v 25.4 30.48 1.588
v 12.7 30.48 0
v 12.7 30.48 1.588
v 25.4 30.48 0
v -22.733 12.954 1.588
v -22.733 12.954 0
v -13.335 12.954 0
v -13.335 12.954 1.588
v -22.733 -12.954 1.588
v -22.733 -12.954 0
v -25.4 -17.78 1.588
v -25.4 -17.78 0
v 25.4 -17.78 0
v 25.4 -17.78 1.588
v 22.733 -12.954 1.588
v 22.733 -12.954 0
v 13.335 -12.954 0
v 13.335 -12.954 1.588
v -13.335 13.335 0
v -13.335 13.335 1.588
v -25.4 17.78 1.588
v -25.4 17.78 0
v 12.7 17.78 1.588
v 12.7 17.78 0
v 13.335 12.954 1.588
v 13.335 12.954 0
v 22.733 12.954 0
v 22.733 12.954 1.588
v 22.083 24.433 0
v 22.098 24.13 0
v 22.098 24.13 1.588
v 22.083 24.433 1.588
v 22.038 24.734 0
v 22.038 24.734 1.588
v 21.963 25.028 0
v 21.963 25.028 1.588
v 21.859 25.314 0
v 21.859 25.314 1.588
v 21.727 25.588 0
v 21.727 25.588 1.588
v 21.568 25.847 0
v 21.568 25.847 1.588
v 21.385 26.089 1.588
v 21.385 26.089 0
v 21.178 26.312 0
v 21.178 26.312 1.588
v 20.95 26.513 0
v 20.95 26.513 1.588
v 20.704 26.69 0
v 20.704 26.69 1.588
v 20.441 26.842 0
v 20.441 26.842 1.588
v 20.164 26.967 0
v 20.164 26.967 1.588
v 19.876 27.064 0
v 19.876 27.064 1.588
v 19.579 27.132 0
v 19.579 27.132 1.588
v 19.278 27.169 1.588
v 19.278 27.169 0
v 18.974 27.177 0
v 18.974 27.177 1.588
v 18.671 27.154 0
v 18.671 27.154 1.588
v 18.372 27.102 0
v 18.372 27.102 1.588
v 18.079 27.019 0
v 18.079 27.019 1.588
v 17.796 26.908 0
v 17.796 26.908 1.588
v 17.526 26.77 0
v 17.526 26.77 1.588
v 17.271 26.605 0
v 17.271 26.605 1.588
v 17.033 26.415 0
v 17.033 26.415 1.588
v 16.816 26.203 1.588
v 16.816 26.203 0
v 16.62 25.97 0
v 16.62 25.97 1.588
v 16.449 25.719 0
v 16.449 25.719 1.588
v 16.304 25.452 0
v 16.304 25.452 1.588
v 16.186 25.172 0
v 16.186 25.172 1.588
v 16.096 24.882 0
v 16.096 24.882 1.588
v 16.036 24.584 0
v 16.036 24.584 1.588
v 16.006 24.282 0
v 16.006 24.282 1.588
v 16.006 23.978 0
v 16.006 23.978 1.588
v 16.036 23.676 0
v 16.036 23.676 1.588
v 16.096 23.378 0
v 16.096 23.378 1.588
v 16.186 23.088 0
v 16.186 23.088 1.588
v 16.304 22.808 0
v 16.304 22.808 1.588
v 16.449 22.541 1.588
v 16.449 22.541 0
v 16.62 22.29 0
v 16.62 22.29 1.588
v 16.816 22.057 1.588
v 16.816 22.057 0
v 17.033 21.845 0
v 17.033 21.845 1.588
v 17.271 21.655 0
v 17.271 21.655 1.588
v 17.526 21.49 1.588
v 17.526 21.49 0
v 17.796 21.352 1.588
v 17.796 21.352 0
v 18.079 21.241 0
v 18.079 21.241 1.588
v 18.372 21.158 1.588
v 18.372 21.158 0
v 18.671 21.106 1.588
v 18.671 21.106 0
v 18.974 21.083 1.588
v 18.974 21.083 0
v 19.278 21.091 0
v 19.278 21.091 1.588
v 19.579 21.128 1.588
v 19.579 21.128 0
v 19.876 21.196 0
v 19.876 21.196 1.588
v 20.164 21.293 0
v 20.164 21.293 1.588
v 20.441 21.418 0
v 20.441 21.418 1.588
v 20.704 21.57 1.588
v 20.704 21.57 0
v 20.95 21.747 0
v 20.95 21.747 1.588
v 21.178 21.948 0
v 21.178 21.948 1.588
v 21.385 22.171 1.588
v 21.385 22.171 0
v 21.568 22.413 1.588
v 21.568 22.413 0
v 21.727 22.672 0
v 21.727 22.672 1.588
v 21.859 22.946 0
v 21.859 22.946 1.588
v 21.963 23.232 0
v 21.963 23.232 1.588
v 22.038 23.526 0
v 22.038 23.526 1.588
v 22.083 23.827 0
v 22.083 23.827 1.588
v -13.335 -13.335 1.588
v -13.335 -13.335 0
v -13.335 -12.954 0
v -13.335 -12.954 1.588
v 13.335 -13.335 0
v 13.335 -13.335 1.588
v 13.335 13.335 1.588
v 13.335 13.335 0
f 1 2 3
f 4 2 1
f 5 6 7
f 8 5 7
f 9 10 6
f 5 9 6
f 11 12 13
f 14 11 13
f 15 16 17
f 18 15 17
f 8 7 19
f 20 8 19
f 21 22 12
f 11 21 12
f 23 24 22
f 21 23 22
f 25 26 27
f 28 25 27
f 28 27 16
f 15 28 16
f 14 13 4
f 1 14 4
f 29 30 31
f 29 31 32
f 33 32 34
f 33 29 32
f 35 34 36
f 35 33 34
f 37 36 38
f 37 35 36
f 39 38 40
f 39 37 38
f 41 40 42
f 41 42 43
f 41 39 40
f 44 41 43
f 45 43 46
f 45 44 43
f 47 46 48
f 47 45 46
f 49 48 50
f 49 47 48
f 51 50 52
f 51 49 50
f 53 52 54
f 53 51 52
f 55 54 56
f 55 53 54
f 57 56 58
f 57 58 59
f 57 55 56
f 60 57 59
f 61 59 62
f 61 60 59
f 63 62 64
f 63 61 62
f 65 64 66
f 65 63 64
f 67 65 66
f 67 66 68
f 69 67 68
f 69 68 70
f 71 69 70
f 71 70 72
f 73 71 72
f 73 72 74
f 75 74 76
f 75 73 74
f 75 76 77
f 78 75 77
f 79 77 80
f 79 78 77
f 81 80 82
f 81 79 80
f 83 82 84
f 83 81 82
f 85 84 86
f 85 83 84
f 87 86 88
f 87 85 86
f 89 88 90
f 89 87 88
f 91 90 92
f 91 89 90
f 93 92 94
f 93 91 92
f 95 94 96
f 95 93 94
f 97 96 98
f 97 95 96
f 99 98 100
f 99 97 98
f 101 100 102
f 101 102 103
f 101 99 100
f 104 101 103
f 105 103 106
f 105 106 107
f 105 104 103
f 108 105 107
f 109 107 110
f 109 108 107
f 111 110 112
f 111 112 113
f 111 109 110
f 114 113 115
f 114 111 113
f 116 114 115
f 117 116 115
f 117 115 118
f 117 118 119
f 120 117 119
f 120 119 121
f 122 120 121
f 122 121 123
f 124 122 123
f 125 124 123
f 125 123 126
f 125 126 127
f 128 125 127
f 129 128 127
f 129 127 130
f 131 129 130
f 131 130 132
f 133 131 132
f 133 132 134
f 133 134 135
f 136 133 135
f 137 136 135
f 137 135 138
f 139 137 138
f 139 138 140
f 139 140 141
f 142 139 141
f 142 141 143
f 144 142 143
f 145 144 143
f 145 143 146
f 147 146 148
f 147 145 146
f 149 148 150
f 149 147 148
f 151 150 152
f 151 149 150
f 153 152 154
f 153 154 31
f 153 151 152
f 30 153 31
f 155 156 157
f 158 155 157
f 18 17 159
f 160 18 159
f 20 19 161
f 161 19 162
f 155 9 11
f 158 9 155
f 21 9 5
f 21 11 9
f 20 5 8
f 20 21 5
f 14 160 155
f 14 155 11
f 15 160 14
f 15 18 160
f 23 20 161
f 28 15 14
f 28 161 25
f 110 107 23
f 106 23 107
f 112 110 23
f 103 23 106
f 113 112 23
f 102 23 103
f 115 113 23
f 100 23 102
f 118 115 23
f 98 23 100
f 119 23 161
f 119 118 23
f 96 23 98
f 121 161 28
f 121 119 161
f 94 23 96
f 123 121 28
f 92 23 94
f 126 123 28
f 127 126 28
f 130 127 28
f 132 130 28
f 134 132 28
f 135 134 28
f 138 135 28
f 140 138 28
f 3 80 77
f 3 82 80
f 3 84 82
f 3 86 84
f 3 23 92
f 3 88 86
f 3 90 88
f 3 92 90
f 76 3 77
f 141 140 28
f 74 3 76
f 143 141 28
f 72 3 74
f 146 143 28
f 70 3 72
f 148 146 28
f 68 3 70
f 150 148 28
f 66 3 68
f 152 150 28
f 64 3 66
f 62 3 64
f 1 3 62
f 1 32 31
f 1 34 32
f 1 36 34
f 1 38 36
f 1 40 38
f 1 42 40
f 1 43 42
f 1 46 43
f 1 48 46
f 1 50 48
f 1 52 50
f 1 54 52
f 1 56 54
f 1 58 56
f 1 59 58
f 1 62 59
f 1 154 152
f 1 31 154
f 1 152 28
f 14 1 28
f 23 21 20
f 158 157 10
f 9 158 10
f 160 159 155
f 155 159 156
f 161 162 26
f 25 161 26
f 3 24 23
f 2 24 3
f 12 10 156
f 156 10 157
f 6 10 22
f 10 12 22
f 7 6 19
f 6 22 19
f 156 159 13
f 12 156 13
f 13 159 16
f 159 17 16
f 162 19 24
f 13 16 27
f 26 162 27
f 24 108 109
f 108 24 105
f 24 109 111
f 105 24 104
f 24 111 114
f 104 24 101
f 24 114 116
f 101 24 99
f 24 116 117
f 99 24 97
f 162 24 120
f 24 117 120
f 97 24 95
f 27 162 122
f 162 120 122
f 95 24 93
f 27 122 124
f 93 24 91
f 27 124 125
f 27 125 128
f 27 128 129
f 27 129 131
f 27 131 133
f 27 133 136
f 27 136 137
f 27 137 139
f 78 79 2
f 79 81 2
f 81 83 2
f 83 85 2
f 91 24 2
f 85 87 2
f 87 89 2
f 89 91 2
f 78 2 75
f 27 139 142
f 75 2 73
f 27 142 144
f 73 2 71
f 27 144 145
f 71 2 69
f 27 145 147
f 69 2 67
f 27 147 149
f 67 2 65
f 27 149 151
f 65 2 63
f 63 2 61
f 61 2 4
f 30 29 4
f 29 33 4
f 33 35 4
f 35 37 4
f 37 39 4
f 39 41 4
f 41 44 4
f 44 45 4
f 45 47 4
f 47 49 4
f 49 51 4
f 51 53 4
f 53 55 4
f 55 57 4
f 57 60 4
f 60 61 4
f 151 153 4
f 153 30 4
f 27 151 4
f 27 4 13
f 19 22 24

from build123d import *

# Parameters (mm, degrees)
F0_W     = 12.7
F0_H     = 12.7
F0_R     = 3.048
F1_DEPTH = 1.5875


with BuildPart() as f1:
    # F0 (on Top) → F1 (new body)
    with BuildSketch(Plane.XY):
        Polygon((-25.4, -17.78), (25.4, -17.78), (25.4, 17.78), (12.7, 17.78), (-25.4, 17.78), align=None)
        Polygon((22.733, 12.954), (22.733, -12.954), (13.335, -12.954), (13.335, -13.335), (-13.335, -13.335), (-13.335, -12.954), (-22.733, -12.954), (-22.733, 12.954), (-13.335, 12.954), (-13.335, 13.335), (13.335, 13.335), (13.335, 12.954), align=None, mode=Mode.SUBTRACT)
        with Locations((19.05, 24.13)):
            Rectangle(F0_W, F0_H)
        with Locations((19.05, 24.13)):
            Circle(F0_R, mode=Mode.SUBTRACT)
    extrude(amount=F1_DEPTH)


solid = f1.part
